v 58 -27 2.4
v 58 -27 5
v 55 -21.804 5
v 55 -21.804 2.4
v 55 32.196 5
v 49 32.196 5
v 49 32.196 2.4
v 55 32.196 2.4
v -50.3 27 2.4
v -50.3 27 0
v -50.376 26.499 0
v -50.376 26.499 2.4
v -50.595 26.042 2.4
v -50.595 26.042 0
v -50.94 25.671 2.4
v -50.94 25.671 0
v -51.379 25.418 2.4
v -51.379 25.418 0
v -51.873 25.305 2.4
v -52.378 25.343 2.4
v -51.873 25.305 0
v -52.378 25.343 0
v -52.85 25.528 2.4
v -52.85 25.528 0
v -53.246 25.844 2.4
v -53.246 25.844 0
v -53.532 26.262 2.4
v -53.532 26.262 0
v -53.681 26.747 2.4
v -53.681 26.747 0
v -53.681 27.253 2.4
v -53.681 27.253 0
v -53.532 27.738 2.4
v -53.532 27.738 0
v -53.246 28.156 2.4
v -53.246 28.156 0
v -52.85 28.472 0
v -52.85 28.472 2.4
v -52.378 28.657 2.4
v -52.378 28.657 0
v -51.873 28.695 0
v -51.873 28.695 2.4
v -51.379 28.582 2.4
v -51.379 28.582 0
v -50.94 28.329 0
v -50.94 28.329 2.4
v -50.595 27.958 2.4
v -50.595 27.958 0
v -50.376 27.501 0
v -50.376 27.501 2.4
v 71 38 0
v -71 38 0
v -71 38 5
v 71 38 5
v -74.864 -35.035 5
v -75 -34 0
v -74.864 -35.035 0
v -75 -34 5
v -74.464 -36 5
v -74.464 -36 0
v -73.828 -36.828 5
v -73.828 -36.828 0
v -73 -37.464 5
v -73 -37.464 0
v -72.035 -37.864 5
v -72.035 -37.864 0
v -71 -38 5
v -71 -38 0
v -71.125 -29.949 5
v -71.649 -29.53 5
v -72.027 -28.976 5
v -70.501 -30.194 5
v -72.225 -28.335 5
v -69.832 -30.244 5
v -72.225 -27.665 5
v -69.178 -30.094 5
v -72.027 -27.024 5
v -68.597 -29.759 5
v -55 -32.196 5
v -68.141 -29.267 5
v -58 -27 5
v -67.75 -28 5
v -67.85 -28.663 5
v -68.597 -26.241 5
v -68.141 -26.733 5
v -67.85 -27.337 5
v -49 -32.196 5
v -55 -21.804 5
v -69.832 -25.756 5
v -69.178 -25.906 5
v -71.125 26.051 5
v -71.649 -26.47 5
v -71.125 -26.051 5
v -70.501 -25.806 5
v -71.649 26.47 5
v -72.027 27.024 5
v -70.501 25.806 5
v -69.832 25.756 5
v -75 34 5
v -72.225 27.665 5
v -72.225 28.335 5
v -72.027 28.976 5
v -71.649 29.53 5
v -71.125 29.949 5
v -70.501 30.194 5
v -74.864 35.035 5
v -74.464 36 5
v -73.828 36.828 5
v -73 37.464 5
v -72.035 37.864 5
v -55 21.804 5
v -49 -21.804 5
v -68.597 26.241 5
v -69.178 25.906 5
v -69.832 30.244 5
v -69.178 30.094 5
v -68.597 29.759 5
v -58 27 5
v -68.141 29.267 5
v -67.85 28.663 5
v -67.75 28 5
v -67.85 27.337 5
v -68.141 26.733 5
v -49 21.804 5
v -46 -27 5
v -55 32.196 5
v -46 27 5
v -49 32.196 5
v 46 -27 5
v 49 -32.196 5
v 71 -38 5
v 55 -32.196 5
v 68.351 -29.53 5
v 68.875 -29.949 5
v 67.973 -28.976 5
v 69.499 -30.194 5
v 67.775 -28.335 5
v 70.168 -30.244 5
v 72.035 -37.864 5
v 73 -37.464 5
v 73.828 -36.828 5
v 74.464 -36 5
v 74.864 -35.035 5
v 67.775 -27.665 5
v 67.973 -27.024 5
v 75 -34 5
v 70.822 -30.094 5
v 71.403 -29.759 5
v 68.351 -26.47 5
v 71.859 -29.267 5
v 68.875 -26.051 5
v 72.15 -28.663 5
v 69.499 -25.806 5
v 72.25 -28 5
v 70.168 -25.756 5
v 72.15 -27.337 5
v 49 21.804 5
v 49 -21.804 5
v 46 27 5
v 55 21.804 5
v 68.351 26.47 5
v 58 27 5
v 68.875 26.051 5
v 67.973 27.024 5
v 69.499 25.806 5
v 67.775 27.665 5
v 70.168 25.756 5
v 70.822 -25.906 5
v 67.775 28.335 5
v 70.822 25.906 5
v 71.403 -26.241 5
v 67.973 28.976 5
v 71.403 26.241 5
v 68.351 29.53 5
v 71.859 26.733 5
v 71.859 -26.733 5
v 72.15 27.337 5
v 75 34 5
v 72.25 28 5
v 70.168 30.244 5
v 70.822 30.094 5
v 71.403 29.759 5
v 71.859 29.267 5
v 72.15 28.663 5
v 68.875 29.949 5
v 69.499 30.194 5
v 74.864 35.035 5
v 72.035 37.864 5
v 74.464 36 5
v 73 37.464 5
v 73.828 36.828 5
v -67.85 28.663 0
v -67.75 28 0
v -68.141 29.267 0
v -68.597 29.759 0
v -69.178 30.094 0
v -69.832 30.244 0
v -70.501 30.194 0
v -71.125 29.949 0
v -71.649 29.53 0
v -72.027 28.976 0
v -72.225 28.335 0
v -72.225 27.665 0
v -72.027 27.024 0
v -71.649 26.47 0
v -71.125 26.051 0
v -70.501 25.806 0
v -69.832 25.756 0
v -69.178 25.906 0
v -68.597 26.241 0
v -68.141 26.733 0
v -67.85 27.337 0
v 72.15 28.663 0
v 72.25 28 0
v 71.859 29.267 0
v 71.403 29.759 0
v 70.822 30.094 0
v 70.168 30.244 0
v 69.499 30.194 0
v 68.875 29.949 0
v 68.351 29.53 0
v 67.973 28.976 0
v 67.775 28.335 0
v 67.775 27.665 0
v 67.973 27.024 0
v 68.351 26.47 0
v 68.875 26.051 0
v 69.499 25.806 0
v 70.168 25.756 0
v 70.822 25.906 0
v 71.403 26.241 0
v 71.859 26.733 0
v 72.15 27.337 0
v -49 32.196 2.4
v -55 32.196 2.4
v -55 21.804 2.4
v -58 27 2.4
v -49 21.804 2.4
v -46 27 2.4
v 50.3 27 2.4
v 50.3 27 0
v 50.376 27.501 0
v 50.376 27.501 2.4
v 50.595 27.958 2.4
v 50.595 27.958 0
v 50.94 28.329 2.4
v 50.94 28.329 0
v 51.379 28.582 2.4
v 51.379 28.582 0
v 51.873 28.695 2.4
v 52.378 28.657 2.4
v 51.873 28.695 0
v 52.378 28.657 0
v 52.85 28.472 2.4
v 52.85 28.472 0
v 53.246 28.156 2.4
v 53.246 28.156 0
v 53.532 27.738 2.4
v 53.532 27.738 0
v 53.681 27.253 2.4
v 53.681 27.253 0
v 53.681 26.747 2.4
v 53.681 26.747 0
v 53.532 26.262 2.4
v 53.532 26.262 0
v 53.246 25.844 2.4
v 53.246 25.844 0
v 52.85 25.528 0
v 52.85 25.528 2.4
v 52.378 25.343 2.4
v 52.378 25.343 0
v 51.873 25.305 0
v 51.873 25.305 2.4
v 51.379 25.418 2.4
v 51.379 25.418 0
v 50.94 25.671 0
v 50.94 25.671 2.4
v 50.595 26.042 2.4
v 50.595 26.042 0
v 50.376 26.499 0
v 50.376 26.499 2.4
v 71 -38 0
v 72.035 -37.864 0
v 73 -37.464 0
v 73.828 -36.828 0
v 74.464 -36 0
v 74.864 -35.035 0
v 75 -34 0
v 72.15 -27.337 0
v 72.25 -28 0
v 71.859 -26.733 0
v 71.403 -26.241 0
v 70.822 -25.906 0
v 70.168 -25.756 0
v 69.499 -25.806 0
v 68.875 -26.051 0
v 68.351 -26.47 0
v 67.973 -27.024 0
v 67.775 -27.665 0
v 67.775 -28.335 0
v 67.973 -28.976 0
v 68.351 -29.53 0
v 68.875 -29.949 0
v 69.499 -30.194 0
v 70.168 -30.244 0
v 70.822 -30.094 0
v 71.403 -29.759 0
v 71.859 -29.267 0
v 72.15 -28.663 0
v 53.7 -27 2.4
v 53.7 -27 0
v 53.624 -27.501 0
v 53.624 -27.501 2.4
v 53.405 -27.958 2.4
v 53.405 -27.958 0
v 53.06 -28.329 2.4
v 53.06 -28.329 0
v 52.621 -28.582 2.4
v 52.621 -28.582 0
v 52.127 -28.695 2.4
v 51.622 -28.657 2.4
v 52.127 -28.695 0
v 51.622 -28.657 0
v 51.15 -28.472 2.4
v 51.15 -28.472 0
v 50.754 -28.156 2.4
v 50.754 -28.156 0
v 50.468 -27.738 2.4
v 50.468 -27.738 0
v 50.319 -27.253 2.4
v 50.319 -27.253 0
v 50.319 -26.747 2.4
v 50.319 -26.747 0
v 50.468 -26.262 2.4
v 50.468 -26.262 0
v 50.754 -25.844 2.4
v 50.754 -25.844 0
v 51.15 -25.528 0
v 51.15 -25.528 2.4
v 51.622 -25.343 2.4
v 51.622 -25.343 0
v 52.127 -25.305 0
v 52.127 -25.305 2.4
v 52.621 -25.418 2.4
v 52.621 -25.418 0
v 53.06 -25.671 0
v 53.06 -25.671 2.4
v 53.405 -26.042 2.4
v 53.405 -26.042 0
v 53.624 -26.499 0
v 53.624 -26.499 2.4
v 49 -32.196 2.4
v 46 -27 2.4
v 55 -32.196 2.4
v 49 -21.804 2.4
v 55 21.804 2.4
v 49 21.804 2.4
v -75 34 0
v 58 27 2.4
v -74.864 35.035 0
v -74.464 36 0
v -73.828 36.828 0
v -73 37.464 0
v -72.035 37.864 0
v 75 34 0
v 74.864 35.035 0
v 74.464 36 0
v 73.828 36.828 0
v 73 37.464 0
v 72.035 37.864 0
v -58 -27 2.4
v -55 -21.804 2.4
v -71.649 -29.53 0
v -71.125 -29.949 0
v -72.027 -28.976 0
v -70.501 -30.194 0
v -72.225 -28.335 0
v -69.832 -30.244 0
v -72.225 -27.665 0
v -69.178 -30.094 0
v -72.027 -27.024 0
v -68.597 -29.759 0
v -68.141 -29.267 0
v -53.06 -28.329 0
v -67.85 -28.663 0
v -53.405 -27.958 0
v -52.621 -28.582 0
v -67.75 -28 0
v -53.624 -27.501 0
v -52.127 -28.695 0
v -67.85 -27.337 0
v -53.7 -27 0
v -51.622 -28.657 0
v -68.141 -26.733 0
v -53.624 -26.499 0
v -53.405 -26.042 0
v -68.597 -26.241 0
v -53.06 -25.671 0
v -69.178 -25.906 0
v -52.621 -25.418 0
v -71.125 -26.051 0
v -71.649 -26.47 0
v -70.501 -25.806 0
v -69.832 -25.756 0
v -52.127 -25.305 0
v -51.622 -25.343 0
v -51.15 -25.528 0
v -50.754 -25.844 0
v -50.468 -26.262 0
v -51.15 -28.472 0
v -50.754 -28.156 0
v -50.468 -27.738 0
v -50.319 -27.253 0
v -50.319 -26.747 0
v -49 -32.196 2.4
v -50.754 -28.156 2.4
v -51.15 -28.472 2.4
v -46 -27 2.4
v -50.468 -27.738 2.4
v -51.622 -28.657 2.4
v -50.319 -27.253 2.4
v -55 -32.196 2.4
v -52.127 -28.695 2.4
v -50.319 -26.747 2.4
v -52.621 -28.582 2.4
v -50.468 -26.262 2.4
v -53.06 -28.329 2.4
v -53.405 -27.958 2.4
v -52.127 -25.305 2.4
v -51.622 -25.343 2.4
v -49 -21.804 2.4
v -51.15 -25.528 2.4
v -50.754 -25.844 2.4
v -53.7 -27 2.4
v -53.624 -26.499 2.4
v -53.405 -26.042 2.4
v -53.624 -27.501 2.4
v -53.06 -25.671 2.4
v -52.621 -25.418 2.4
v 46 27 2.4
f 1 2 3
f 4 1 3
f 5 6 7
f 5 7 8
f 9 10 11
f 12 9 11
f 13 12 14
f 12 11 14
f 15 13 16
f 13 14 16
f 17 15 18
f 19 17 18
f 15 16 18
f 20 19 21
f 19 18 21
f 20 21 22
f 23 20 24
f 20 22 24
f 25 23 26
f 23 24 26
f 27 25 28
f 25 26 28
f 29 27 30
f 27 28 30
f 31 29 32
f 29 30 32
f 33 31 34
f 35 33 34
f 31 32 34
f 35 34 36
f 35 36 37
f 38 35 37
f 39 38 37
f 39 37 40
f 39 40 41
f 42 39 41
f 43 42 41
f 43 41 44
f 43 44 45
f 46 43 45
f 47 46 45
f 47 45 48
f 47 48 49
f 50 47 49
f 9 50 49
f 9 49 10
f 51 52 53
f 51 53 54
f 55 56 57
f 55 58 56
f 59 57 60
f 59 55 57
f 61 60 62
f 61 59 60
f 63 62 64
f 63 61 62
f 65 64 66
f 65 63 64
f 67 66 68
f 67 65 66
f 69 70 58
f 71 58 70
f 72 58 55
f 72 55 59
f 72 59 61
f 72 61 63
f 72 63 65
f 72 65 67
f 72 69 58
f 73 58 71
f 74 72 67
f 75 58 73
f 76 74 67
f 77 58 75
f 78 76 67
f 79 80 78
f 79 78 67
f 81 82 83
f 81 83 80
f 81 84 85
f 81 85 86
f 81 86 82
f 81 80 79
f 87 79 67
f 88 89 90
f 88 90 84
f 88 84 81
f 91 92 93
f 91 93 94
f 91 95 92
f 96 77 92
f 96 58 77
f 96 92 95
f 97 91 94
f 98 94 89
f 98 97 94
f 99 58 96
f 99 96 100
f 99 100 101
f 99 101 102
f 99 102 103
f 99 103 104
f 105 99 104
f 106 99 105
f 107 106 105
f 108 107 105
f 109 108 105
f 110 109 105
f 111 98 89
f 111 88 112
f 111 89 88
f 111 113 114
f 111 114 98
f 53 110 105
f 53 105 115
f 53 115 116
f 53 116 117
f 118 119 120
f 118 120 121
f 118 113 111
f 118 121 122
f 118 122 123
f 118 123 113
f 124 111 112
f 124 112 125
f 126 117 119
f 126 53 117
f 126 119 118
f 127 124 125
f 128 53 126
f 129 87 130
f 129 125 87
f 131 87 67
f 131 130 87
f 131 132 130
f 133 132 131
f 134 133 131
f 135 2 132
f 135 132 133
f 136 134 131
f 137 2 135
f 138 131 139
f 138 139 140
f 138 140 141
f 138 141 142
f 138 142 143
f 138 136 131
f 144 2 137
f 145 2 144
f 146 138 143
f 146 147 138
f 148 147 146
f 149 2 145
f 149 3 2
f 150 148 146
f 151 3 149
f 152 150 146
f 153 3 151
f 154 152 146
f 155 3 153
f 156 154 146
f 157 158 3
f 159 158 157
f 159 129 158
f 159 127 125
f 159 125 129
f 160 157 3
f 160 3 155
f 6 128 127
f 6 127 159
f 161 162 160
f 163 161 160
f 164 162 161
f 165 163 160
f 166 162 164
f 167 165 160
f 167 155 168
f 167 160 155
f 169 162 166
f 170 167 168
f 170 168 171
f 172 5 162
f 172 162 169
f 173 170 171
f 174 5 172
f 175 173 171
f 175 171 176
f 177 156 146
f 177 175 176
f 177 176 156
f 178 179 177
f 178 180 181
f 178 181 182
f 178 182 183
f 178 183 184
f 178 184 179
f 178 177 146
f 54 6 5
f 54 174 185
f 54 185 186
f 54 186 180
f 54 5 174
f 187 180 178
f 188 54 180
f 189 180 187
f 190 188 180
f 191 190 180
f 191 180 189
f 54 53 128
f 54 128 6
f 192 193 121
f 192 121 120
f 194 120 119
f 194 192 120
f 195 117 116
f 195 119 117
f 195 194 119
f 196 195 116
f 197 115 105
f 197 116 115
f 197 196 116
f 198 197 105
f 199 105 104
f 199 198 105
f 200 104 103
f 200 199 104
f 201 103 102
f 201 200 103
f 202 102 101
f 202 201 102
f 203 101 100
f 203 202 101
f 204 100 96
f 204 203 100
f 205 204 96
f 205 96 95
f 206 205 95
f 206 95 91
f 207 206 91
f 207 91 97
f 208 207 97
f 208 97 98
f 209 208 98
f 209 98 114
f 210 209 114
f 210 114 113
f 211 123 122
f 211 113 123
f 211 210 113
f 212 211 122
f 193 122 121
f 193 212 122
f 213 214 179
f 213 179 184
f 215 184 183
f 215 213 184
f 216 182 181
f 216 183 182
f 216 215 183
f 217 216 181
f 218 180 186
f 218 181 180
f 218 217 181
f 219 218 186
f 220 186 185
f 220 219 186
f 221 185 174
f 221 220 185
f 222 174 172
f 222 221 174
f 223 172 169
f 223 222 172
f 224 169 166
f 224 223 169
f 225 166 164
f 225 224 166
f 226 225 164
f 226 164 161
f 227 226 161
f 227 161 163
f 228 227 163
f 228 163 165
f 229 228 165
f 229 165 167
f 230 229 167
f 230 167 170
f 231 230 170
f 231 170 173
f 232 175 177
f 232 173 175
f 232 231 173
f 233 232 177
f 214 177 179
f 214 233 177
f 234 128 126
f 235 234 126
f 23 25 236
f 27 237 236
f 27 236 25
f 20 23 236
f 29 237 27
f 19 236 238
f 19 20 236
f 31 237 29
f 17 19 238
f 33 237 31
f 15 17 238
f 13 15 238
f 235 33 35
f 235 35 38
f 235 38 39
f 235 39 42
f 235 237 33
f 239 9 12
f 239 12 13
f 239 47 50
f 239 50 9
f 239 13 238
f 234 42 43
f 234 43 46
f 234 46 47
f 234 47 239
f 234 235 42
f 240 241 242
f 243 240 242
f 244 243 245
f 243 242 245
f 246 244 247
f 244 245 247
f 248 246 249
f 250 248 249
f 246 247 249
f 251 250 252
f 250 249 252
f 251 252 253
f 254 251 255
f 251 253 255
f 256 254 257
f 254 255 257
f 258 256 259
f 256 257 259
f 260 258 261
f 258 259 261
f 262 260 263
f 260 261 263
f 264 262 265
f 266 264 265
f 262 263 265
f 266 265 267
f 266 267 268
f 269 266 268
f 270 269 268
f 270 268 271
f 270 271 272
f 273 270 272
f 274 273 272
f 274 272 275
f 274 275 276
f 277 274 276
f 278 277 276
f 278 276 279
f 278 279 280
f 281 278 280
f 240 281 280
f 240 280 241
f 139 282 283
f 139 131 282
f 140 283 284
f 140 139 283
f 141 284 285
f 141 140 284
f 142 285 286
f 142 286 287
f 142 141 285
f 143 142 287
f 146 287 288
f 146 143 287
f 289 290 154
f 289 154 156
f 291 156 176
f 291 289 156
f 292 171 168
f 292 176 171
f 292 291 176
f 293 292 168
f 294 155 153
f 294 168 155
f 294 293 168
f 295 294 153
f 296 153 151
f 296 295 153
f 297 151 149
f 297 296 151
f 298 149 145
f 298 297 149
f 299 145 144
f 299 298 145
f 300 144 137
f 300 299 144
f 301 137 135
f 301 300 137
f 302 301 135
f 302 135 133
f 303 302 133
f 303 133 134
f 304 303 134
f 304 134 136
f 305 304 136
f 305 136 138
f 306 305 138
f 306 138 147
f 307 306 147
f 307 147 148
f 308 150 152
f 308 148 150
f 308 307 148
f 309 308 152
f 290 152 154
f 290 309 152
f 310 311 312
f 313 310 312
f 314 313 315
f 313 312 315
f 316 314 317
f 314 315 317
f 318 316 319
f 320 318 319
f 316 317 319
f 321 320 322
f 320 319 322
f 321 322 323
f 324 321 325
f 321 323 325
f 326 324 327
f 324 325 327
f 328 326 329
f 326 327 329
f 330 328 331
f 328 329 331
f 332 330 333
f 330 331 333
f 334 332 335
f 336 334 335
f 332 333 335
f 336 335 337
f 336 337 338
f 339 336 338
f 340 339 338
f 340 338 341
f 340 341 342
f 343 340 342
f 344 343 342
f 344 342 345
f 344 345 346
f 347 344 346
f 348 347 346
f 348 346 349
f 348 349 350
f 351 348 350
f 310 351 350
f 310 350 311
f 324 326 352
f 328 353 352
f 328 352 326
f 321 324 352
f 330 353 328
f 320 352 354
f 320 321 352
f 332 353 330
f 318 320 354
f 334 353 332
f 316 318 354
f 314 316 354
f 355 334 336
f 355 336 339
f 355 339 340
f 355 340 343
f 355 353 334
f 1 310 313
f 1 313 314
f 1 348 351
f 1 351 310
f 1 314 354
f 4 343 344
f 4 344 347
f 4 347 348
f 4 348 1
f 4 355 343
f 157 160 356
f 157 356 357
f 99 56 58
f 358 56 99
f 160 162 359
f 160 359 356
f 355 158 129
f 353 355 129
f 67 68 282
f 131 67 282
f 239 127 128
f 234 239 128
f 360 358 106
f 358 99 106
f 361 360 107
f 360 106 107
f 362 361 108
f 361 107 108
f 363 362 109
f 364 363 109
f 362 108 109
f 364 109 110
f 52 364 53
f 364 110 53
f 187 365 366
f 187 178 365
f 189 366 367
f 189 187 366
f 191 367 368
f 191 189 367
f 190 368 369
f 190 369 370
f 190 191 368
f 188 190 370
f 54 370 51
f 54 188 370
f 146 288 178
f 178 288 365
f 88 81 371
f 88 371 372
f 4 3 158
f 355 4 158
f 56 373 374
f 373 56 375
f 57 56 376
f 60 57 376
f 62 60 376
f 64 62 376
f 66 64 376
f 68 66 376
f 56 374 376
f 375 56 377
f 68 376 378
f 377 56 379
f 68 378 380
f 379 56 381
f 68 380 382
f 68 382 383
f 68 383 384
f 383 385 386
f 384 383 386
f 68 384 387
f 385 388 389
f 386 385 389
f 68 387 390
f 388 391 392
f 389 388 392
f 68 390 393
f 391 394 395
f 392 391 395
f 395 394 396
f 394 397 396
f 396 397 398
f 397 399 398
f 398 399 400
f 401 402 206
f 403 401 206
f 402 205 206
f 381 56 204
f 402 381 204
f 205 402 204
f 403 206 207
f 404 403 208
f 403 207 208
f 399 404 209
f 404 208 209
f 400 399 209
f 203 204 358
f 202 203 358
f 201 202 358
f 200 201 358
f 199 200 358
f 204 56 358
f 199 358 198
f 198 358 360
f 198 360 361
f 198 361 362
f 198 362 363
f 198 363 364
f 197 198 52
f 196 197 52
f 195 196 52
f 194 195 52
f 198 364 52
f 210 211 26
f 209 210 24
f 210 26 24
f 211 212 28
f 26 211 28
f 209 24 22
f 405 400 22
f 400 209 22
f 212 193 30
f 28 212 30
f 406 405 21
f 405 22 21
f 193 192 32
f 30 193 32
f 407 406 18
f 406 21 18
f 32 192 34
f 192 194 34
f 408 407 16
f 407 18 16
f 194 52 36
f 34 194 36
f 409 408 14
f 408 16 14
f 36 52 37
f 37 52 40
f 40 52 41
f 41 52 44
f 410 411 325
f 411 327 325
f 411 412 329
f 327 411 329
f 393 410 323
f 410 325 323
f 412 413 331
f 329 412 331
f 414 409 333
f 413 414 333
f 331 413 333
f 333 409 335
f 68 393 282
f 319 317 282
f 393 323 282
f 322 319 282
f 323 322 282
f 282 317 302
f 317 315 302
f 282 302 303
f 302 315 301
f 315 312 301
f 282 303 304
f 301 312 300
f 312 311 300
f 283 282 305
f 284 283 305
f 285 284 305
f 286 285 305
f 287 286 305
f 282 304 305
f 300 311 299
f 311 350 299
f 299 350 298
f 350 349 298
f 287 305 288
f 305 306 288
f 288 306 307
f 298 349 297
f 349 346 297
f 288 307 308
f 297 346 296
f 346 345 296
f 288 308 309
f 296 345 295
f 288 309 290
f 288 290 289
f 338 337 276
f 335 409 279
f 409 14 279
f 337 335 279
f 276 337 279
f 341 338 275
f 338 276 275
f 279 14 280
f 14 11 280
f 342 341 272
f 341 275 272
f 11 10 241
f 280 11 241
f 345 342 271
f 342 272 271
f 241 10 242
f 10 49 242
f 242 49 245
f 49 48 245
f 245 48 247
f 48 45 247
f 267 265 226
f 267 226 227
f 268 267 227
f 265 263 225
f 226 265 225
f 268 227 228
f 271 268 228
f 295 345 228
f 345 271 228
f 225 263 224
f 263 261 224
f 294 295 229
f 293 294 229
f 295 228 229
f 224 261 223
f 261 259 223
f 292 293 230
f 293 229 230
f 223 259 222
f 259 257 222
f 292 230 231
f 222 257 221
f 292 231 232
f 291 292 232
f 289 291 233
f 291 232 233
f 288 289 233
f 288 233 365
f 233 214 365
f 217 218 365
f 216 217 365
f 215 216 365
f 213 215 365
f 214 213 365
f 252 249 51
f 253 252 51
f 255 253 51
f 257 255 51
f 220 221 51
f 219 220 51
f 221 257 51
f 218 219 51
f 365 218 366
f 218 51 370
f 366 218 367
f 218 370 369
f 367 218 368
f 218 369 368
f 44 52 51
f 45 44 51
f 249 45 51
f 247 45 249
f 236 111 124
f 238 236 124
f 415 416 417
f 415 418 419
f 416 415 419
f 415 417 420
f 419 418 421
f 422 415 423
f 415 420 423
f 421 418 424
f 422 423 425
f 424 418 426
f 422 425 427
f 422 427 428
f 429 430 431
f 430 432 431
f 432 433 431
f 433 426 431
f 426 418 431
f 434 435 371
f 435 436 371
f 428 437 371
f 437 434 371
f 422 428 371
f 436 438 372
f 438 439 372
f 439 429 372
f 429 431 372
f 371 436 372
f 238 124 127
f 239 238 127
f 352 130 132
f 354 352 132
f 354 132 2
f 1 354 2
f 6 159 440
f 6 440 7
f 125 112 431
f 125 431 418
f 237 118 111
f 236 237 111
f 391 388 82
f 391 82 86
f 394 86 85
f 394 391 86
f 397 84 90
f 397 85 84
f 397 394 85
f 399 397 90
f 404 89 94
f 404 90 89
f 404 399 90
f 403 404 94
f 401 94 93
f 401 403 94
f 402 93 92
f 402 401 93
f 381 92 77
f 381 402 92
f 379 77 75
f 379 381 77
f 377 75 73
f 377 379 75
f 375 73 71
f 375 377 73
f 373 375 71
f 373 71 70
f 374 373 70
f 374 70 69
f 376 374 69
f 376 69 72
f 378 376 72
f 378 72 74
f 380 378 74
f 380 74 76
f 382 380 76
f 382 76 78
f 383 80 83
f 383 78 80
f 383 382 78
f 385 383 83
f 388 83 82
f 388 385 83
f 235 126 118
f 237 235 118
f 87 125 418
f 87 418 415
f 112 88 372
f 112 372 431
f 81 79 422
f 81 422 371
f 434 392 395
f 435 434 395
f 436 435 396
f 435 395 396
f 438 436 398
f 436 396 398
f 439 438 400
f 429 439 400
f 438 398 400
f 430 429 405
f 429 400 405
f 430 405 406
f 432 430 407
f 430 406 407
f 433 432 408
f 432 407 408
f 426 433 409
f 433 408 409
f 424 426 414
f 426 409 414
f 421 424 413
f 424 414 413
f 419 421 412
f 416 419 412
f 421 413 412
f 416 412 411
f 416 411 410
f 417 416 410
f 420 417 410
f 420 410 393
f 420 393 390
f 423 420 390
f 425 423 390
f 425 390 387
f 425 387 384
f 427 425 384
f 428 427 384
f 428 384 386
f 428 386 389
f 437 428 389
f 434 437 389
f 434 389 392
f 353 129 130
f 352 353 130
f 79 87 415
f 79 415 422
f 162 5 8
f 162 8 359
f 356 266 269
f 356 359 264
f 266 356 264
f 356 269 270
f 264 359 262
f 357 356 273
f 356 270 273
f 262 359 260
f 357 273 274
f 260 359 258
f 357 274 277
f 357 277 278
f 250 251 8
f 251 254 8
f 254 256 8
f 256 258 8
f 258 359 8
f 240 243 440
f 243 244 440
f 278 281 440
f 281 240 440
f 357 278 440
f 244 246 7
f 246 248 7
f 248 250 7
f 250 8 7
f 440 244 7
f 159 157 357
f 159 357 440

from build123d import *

# Parameters (mm, degrees)
SKETCH1_W               = 150
SKETCH1_H               = 76
BOSS_EXTRUDE1_DEPTH     = 5
FILLET1_R               = 4
SKETCH2_R               = 1.7
CUT_EXTRUDE1_DEPTH      = 85.225886757
CUT_EXTRUDE2_DEPTH      = 2.6
CUT_EXTRUDE3_DEPTH      = 85.225886757
CUT_EXTRUDE3_DEPTH_BACK = 85.225886757
SKETCH4_R               = 2.25


with BuildPart() as part:
    # Sketch1 → Boss-Extrude1 (new body)
    with BuildSketch(Plane.XY):
        Rectangle(SKETCH1_W, SKETCH1_H)
    extrude(amount=BOSS_EXTRUDE1_DEPTH)

    # Fillet1
    fillet1_edges = [part.edges().sort_by_distance(p)[0] for p in [
        (-75, 38, 2.5),
        (75, 38, 2.5),
        (75, -38, 2.5),
        (-75, -38, 2.5),
    ]]
    fillet(fillet1_edges, radius=FILLET1_R)

    # Sketch2 → Cut-Extrude1 (cut, through all)
    with BuildSketch(Plane(origin=(0, 0, 0), x_dir=(-1, 0, 0), z_dir=(0, 0, -1))):
        with Locations((52, -27)):
            Circle(SKETCH2_R)
        with Locations(Location((52, 27, 0), (0, 0, 180))):
            Circle(SKETCH2_R)
        with Locations((-52, 27)):
            Circle(SKETCH2_R)
        with Locations(Location((-52, -27, 0), (0, 0, 180))):
            Circle(SKETCH2_R)
    extrude(amount=-CUT_EXTRUDE1_DEPTH, mode=Mode.SUBTRACT)

    # Sketch3 → Cut-Extrude2 (cut)
    with BuildSketch(Plane.XY.offset(5)):
        Polygon((-49, 21.803847577), (-46, 27), (-49, 32.196152423), (-55, 32.196152423), (-58, 27), (-55, 21.803847577), align=None)
        Polygon((55, 21.803847577), (49, 21.803847577), (46, 27), (49, 32.196152423), (55, 32.196152423), (58, 27), align=None)
        Polygon((49, -21.803847577), (46, -27), (49, -32.196152423), (55, -32.196152423), (58, -27), (55, -21.803847577), align=None)
        Polygon((-55, -21.803847577), (-49, -21.803847577), (-46, -27), (-49, -32.196152423), (-55, -32.196152423), (-58, -27), align=None)
    extrude(amount=-CUT_EXTRUDE2_DEPTH, mode=Mode.SUBTRACT)

    # Sketch4 → Cut-Extrude3 (cut, two sides: drawn at the far end of the back side and taken through both)
    with BuildSketch(Plane.XY.offset(5).offset(-CUT_EXTRUDE3_DEPTH_BACK)):
        with Locations((-70, 28)):
            Circle(SKETCH4_R)
        with Locations((70, 28)):
            Circle(SKETCH4_R)
        with Locations((70, -28)):
            Circle(SKETCH4_R)
        with Locations((-70, -28)):
            Circle(SKETCH4_R)
    extrude(amount=CUT_EXTRUDE3_DEPTH + CUT_EXTRUDE3_DEPTH_BACK, mode=Mode.SUBTRACT)


solid = part.part
